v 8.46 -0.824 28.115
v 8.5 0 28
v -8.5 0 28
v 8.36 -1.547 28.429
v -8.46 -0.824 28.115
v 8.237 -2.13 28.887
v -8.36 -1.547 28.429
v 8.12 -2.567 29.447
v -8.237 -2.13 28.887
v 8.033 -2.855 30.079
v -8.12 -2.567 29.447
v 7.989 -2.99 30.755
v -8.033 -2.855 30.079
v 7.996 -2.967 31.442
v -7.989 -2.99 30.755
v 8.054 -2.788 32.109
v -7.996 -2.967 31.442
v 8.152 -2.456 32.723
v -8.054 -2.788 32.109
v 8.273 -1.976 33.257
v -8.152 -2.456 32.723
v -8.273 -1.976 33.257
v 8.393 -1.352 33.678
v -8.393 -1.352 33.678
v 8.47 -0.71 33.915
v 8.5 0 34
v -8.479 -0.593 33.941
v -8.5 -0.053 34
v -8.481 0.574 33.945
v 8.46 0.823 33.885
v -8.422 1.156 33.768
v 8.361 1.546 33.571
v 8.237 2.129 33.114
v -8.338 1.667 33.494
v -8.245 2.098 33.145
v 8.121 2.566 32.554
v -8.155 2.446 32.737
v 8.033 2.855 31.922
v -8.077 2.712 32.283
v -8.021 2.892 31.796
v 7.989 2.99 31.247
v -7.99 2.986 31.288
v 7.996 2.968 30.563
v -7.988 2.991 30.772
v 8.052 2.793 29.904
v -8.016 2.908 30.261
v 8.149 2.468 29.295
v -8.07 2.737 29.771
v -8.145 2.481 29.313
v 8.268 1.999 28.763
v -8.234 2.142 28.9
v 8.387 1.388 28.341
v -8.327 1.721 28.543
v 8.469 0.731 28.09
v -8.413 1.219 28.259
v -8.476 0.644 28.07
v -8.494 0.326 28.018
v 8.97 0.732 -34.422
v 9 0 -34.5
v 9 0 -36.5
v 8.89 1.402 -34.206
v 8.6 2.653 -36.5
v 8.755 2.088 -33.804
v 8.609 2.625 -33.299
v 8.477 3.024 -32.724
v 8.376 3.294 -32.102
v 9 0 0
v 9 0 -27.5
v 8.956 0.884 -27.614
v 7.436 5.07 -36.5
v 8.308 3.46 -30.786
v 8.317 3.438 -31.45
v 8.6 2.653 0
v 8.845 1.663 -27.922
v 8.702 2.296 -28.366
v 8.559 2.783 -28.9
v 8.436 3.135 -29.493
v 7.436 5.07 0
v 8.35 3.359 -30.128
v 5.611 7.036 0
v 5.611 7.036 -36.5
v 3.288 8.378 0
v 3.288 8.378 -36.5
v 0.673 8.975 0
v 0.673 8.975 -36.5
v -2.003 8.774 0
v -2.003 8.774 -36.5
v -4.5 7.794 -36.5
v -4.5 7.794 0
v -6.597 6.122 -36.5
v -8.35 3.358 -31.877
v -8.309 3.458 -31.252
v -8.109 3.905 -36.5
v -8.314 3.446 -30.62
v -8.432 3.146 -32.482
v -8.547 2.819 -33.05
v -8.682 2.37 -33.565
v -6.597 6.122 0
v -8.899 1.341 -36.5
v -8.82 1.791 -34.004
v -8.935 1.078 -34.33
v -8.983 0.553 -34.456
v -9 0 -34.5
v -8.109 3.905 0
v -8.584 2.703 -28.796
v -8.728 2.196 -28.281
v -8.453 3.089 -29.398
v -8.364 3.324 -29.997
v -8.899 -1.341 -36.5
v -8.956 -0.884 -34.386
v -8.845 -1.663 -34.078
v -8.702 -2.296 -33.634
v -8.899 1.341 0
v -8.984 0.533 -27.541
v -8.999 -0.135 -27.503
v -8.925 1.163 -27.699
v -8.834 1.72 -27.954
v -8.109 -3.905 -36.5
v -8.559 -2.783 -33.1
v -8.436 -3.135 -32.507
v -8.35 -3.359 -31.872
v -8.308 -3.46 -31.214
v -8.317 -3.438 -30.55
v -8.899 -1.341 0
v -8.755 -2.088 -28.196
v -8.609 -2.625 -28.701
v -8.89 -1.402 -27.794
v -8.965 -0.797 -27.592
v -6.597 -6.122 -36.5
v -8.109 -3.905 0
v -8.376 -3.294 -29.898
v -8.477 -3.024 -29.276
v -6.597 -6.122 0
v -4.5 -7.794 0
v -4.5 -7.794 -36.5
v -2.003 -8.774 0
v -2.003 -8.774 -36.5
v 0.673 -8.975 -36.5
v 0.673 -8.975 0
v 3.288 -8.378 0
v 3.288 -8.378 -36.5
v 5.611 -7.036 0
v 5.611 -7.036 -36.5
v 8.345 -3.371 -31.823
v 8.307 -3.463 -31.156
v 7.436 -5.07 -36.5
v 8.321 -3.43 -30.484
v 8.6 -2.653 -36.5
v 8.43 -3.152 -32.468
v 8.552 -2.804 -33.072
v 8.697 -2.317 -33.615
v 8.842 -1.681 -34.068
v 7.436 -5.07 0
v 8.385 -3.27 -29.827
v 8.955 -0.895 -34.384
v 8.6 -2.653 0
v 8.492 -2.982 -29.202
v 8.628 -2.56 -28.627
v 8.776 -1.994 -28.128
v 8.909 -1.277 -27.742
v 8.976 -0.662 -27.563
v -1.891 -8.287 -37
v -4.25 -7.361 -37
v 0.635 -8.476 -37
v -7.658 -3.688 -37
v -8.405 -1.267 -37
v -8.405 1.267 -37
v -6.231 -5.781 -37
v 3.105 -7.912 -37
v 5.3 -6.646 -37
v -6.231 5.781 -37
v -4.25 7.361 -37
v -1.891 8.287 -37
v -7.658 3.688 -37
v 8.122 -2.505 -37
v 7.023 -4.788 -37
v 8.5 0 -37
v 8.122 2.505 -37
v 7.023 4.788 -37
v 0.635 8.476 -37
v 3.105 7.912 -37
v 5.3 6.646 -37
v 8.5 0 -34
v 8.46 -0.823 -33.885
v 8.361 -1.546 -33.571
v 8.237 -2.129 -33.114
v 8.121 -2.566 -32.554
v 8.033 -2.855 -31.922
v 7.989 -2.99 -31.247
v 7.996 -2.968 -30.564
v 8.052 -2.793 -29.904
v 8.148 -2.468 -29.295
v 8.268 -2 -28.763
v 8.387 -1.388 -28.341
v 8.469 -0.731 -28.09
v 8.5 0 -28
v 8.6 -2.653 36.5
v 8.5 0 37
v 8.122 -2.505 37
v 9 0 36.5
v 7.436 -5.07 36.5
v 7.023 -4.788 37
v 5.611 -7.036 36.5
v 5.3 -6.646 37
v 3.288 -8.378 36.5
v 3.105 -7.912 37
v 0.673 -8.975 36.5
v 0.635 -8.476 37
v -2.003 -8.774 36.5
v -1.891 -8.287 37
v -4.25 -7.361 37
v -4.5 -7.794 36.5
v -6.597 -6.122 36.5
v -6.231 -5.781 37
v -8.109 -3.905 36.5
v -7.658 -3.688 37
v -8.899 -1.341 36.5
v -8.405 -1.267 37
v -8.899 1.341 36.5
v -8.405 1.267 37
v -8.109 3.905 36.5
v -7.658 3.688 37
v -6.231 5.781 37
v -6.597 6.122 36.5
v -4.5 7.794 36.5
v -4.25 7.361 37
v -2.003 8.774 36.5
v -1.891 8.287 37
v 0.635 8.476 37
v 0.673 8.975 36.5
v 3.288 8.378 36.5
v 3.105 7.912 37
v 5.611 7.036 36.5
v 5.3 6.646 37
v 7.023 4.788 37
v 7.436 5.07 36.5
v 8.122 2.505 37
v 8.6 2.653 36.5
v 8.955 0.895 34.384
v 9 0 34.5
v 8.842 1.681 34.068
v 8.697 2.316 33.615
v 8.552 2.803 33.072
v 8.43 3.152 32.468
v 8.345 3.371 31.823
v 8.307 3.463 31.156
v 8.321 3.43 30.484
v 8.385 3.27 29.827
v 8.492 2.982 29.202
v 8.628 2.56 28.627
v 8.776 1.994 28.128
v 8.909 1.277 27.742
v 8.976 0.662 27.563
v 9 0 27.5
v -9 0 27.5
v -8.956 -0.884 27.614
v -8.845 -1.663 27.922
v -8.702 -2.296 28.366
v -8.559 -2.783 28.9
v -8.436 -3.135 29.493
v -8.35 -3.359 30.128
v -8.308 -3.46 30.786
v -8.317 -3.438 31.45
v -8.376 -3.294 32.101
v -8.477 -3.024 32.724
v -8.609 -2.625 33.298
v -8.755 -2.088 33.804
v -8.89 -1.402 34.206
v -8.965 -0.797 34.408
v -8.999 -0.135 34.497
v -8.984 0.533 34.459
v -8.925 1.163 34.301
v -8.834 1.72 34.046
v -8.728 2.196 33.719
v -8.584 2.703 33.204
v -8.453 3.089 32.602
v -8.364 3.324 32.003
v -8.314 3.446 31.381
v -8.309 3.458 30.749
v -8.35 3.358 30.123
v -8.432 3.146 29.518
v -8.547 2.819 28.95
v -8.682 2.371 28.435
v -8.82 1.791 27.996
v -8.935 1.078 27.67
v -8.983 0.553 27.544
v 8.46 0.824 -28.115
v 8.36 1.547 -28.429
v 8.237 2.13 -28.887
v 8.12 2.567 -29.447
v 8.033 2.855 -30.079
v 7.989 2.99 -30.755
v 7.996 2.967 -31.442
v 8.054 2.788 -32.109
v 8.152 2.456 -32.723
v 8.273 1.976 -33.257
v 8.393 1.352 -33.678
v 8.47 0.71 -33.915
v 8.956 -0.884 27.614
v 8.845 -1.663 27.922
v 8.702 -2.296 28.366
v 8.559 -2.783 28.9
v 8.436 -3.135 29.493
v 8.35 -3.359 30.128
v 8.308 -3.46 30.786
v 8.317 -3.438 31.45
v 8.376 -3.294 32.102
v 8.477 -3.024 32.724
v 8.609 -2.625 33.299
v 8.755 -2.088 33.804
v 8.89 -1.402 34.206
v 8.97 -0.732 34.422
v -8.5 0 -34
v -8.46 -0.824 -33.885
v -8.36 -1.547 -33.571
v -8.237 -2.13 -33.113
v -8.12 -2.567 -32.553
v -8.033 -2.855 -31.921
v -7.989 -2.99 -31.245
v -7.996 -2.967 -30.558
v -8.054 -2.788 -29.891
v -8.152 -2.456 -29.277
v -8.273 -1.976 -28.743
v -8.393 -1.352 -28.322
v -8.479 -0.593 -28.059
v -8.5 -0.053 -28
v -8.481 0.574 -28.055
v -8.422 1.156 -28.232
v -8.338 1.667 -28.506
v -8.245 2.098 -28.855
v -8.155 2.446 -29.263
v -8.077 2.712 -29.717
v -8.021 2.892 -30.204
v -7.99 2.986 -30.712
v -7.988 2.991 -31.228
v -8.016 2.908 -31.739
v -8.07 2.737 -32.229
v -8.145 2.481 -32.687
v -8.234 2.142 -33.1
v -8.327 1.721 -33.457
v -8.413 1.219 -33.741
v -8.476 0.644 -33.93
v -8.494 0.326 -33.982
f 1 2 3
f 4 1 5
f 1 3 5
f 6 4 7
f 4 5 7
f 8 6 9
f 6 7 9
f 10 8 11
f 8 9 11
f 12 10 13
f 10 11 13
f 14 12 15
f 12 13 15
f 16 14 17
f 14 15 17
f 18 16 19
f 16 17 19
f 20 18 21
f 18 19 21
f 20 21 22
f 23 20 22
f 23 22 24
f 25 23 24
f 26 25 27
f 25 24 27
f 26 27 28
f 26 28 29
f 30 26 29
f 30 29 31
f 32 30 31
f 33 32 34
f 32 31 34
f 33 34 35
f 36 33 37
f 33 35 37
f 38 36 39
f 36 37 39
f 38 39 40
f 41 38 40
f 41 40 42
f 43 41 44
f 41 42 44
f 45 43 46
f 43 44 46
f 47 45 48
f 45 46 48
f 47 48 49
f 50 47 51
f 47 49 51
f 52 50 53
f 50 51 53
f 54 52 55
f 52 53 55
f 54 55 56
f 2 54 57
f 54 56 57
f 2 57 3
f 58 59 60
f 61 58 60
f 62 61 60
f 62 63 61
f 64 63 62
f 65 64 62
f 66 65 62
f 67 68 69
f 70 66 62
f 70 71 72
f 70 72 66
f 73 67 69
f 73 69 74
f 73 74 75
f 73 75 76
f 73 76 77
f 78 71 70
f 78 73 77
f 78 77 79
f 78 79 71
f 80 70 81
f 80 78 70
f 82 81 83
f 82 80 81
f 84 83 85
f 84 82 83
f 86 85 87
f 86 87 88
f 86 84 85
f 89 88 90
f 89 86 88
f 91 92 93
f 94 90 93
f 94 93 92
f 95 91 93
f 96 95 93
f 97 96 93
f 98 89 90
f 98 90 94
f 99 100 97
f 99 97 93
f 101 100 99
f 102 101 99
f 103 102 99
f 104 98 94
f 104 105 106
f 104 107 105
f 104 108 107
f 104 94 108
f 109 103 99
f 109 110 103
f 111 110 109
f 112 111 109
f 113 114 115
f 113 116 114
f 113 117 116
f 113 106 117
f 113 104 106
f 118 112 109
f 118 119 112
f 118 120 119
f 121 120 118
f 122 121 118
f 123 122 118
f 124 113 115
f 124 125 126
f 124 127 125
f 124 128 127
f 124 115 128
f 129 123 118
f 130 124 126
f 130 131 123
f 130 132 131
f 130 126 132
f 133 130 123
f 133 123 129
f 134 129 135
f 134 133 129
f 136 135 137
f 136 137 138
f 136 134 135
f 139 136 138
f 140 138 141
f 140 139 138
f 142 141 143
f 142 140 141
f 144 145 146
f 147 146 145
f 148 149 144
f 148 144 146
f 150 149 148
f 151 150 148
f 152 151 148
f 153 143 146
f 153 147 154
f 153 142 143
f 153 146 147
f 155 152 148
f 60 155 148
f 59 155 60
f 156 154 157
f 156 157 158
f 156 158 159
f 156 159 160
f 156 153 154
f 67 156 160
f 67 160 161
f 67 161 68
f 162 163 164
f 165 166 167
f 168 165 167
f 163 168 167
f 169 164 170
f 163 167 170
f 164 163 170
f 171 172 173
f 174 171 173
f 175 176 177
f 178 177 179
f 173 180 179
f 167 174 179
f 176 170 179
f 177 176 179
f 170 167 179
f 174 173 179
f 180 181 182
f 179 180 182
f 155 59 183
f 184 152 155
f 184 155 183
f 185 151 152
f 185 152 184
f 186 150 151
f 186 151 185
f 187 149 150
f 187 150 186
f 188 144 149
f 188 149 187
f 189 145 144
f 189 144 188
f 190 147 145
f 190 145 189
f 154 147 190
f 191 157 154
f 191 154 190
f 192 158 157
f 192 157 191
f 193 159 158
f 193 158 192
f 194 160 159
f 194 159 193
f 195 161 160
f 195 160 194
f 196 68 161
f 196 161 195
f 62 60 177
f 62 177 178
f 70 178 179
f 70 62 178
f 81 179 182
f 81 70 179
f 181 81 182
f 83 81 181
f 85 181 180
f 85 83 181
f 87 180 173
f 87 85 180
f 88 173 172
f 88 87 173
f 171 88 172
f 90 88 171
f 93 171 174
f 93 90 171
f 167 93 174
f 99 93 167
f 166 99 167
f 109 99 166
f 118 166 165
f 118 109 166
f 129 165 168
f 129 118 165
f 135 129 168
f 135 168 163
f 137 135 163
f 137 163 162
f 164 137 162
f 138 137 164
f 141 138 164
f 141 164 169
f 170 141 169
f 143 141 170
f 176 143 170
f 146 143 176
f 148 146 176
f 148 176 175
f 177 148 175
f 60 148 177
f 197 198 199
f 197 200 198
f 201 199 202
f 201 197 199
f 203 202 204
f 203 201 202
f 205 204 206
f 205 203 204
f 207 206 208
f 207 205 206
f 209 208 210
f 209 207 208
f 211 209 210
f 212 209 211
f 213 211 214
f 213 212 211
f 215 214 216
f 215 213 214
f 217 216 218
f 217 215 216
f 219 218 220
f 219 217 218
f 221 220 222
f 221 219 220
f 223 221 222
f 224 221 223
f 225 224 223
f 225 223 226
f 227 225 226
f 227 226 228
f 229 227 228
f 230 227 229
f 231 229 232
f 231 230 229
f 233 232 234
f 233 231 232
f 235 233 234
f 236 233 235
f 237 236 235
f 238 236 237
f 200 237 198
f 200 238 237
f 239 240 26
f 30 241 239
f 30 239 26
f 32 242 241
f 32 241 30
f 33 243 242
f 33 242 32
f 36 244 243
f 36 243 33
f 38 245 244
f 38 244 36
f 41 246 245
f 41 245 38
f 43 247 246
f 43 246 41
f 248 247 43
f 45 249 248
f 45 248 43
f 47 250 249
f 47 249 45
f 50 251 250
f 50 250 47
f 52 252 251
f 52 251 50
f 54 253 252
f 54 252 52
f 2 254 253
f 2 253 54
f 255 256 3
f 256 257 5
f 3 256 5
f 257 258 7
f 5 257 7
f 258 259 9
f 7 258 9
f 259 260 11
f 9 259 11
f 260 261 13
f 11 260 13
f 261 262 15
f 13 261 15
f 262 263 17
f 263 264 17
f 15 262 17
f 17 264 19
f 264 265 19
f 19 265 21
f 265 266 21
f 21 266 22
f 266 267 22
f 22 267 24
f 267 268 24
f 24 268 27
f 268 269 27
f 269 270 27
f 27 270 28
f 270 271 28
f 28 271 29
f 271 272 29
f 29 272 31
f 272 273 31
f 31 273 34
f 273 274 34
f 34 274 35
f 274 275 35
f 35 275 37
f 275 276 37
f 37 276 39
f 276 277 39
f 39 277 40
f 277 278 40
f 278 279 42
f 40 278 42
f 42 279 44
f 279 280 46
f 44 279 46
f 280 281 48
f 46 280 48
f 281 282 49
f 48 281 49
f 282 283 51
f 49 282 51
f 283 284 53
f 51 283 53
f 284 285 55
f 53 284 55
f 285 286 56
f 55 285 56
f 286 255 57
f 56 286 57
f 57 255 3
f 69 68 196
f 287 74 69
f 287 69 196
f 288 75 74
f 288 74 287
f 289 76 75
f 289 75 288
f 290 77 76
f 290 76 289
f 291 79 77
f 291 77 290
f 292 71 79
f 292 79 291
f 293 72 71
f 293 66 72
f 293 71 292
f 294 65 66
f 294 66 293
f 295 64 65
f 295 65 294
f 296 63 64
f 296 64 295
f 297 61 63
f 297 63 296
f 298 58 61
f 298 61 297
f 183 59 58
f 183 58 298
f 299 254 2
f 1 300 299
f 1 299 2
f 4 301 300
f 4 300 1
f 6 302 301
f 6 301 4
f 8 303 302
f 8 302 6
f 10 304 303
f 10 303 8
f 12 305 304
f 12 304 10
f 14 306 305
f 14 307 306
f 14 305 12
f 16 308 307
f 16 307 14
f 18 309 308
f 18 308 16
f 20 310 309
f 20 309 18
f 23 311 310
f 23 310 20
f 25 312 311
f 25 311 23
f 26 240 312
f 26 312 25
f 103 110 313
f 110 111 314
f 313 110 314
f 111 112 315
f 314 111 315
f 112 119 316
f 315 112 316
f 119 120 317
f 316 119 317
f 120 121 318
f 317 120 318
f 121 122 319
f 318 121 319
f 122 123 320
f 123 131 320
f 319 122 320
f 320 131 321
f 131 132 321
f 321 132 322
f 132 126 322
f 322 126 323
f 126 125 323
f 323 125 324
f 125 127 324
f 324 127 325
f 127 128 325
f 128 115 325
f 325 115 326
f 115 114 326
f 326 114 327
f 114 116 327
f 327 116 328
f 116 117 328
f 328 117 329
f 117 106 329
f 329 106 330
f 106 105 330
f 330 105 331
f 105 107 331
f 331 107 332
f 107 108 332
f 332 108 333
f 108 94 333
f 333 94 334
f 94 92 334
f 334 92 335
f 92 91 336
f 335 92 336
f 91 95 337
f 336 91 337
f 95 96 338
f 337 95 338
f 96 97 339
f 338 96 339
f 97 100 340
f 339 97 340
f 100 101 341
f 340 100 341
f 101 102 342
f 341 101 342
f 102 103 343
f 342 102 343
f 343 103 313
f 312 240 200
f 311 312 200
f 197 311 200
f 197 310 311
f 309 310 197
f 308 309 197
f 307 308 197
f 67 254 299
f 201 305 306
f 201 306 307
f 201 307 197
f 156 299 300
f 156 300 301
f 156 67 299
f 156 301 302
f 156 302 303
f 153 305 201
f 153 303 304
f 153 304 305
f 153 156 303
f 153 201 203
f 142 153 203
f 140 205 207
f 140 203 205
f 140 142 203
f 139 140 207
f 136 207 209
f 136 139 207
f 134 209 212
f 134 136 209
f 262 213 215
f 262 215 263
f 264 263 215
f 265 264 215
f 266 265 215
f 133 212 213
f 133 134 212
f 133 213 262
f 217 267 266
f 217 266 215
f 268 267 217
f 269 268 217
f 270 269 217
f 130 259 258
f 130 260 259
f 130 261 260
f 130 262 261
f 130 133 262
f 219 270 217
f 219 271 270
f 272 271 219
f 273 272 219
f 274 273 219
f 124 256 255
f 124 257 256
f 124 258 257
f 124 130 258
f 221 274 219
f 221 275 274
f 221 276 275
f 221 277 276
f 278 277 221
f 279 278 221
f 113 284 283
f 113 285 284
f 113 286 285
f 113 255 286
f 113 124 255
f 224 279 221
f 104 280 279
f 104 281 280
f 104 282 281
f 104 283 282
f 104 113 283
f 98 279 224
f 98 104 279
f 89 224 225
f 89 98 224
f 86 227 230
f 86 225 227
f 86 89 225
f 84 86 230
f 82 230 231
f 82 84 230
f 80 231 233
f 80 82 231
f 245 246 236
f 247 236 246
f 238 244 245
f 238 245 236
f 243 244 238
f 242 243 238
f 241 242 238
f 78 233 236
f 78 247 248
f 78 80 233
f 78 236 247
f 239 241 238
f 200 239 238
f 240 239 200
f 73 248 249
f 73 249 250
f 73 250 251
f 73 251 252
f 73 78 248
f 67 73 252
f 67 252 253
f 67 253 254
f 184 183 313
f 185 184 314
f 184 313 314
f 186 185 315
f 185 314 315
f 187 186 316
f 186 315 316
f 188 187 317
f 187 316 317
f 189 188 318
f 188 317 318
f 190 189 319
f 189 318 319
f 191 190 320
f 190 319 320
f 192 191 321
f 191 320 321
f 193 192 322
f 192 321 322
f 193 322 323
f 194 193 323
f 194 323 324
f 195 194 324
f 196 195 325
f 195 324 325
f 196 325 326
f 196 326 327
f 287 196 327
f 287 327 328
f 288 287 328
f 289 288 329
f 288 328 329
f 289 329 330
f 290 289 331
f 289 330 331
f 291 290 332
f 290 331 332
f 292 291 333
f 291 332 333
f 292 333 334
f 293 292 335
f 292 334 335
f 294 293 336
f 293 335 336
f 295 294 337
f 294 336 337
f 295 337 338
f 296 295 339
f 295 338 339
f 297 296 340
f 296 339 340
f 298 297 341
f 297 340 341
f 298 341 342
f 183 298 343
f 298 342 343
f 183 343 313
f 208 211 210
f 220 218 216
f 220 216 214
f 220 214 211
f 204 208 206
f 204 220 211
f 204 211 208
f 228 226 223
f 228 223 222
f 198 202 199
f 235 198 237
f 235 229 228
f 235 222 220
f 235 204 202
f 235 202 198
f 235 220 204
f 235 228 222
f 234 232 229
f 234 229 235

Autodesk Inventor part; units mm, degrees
ref_plane "YZ Plane" through (0, 0, 0) normal (1, 0, 0) x (0, 1, 0)
ref_plane "XZ Plane" through (0, 0, 0) normal (0, 1, 0) x (-1, 0, 0)
ref_plane "XY Plane" through (0, 0, 0) normal (0, 0, 1) x (1, 0, 0)
sketch "Schizzo1" plane through (0, 0, 0) normal (0, 0, 1) x (1, 0, 0)
  circle A0 centre (0, 0) radius 9
  dimension "diametro" = 18
extrude "Estrusione1" add sketch "Schizzo1" along normal mid plane 74
sketch "Schizzo2" plane through (0, 0, 0) normal (1, 0, 0) x (0, 1, 0)
  line L0 (0, 0) -> (0, -36.2228) construction
  line L1 (0, 0) -> (14.2779, 0) construction
  point P0 (0, -31)
  point P1 (0, 31)
  dimension "L1" = 62
hole "Foro1" at (0, 0, -31) at (0, 0, 31) direction (-1, 0, 0) diameter 6 end through all both
chamfer "Smusso1" distance 0.5 angle 45 8 edges at (-9, 0, 37) (-9, 0, -37) (8.4853, -3, 31) (8.4853, 3, 31) (-9, 0.0004, 34) (8.4853, 3, -31) (8.4853, -3, -31) (-9, 0.0004, -28)
properties part number "05-16-2023 Perno-02"
